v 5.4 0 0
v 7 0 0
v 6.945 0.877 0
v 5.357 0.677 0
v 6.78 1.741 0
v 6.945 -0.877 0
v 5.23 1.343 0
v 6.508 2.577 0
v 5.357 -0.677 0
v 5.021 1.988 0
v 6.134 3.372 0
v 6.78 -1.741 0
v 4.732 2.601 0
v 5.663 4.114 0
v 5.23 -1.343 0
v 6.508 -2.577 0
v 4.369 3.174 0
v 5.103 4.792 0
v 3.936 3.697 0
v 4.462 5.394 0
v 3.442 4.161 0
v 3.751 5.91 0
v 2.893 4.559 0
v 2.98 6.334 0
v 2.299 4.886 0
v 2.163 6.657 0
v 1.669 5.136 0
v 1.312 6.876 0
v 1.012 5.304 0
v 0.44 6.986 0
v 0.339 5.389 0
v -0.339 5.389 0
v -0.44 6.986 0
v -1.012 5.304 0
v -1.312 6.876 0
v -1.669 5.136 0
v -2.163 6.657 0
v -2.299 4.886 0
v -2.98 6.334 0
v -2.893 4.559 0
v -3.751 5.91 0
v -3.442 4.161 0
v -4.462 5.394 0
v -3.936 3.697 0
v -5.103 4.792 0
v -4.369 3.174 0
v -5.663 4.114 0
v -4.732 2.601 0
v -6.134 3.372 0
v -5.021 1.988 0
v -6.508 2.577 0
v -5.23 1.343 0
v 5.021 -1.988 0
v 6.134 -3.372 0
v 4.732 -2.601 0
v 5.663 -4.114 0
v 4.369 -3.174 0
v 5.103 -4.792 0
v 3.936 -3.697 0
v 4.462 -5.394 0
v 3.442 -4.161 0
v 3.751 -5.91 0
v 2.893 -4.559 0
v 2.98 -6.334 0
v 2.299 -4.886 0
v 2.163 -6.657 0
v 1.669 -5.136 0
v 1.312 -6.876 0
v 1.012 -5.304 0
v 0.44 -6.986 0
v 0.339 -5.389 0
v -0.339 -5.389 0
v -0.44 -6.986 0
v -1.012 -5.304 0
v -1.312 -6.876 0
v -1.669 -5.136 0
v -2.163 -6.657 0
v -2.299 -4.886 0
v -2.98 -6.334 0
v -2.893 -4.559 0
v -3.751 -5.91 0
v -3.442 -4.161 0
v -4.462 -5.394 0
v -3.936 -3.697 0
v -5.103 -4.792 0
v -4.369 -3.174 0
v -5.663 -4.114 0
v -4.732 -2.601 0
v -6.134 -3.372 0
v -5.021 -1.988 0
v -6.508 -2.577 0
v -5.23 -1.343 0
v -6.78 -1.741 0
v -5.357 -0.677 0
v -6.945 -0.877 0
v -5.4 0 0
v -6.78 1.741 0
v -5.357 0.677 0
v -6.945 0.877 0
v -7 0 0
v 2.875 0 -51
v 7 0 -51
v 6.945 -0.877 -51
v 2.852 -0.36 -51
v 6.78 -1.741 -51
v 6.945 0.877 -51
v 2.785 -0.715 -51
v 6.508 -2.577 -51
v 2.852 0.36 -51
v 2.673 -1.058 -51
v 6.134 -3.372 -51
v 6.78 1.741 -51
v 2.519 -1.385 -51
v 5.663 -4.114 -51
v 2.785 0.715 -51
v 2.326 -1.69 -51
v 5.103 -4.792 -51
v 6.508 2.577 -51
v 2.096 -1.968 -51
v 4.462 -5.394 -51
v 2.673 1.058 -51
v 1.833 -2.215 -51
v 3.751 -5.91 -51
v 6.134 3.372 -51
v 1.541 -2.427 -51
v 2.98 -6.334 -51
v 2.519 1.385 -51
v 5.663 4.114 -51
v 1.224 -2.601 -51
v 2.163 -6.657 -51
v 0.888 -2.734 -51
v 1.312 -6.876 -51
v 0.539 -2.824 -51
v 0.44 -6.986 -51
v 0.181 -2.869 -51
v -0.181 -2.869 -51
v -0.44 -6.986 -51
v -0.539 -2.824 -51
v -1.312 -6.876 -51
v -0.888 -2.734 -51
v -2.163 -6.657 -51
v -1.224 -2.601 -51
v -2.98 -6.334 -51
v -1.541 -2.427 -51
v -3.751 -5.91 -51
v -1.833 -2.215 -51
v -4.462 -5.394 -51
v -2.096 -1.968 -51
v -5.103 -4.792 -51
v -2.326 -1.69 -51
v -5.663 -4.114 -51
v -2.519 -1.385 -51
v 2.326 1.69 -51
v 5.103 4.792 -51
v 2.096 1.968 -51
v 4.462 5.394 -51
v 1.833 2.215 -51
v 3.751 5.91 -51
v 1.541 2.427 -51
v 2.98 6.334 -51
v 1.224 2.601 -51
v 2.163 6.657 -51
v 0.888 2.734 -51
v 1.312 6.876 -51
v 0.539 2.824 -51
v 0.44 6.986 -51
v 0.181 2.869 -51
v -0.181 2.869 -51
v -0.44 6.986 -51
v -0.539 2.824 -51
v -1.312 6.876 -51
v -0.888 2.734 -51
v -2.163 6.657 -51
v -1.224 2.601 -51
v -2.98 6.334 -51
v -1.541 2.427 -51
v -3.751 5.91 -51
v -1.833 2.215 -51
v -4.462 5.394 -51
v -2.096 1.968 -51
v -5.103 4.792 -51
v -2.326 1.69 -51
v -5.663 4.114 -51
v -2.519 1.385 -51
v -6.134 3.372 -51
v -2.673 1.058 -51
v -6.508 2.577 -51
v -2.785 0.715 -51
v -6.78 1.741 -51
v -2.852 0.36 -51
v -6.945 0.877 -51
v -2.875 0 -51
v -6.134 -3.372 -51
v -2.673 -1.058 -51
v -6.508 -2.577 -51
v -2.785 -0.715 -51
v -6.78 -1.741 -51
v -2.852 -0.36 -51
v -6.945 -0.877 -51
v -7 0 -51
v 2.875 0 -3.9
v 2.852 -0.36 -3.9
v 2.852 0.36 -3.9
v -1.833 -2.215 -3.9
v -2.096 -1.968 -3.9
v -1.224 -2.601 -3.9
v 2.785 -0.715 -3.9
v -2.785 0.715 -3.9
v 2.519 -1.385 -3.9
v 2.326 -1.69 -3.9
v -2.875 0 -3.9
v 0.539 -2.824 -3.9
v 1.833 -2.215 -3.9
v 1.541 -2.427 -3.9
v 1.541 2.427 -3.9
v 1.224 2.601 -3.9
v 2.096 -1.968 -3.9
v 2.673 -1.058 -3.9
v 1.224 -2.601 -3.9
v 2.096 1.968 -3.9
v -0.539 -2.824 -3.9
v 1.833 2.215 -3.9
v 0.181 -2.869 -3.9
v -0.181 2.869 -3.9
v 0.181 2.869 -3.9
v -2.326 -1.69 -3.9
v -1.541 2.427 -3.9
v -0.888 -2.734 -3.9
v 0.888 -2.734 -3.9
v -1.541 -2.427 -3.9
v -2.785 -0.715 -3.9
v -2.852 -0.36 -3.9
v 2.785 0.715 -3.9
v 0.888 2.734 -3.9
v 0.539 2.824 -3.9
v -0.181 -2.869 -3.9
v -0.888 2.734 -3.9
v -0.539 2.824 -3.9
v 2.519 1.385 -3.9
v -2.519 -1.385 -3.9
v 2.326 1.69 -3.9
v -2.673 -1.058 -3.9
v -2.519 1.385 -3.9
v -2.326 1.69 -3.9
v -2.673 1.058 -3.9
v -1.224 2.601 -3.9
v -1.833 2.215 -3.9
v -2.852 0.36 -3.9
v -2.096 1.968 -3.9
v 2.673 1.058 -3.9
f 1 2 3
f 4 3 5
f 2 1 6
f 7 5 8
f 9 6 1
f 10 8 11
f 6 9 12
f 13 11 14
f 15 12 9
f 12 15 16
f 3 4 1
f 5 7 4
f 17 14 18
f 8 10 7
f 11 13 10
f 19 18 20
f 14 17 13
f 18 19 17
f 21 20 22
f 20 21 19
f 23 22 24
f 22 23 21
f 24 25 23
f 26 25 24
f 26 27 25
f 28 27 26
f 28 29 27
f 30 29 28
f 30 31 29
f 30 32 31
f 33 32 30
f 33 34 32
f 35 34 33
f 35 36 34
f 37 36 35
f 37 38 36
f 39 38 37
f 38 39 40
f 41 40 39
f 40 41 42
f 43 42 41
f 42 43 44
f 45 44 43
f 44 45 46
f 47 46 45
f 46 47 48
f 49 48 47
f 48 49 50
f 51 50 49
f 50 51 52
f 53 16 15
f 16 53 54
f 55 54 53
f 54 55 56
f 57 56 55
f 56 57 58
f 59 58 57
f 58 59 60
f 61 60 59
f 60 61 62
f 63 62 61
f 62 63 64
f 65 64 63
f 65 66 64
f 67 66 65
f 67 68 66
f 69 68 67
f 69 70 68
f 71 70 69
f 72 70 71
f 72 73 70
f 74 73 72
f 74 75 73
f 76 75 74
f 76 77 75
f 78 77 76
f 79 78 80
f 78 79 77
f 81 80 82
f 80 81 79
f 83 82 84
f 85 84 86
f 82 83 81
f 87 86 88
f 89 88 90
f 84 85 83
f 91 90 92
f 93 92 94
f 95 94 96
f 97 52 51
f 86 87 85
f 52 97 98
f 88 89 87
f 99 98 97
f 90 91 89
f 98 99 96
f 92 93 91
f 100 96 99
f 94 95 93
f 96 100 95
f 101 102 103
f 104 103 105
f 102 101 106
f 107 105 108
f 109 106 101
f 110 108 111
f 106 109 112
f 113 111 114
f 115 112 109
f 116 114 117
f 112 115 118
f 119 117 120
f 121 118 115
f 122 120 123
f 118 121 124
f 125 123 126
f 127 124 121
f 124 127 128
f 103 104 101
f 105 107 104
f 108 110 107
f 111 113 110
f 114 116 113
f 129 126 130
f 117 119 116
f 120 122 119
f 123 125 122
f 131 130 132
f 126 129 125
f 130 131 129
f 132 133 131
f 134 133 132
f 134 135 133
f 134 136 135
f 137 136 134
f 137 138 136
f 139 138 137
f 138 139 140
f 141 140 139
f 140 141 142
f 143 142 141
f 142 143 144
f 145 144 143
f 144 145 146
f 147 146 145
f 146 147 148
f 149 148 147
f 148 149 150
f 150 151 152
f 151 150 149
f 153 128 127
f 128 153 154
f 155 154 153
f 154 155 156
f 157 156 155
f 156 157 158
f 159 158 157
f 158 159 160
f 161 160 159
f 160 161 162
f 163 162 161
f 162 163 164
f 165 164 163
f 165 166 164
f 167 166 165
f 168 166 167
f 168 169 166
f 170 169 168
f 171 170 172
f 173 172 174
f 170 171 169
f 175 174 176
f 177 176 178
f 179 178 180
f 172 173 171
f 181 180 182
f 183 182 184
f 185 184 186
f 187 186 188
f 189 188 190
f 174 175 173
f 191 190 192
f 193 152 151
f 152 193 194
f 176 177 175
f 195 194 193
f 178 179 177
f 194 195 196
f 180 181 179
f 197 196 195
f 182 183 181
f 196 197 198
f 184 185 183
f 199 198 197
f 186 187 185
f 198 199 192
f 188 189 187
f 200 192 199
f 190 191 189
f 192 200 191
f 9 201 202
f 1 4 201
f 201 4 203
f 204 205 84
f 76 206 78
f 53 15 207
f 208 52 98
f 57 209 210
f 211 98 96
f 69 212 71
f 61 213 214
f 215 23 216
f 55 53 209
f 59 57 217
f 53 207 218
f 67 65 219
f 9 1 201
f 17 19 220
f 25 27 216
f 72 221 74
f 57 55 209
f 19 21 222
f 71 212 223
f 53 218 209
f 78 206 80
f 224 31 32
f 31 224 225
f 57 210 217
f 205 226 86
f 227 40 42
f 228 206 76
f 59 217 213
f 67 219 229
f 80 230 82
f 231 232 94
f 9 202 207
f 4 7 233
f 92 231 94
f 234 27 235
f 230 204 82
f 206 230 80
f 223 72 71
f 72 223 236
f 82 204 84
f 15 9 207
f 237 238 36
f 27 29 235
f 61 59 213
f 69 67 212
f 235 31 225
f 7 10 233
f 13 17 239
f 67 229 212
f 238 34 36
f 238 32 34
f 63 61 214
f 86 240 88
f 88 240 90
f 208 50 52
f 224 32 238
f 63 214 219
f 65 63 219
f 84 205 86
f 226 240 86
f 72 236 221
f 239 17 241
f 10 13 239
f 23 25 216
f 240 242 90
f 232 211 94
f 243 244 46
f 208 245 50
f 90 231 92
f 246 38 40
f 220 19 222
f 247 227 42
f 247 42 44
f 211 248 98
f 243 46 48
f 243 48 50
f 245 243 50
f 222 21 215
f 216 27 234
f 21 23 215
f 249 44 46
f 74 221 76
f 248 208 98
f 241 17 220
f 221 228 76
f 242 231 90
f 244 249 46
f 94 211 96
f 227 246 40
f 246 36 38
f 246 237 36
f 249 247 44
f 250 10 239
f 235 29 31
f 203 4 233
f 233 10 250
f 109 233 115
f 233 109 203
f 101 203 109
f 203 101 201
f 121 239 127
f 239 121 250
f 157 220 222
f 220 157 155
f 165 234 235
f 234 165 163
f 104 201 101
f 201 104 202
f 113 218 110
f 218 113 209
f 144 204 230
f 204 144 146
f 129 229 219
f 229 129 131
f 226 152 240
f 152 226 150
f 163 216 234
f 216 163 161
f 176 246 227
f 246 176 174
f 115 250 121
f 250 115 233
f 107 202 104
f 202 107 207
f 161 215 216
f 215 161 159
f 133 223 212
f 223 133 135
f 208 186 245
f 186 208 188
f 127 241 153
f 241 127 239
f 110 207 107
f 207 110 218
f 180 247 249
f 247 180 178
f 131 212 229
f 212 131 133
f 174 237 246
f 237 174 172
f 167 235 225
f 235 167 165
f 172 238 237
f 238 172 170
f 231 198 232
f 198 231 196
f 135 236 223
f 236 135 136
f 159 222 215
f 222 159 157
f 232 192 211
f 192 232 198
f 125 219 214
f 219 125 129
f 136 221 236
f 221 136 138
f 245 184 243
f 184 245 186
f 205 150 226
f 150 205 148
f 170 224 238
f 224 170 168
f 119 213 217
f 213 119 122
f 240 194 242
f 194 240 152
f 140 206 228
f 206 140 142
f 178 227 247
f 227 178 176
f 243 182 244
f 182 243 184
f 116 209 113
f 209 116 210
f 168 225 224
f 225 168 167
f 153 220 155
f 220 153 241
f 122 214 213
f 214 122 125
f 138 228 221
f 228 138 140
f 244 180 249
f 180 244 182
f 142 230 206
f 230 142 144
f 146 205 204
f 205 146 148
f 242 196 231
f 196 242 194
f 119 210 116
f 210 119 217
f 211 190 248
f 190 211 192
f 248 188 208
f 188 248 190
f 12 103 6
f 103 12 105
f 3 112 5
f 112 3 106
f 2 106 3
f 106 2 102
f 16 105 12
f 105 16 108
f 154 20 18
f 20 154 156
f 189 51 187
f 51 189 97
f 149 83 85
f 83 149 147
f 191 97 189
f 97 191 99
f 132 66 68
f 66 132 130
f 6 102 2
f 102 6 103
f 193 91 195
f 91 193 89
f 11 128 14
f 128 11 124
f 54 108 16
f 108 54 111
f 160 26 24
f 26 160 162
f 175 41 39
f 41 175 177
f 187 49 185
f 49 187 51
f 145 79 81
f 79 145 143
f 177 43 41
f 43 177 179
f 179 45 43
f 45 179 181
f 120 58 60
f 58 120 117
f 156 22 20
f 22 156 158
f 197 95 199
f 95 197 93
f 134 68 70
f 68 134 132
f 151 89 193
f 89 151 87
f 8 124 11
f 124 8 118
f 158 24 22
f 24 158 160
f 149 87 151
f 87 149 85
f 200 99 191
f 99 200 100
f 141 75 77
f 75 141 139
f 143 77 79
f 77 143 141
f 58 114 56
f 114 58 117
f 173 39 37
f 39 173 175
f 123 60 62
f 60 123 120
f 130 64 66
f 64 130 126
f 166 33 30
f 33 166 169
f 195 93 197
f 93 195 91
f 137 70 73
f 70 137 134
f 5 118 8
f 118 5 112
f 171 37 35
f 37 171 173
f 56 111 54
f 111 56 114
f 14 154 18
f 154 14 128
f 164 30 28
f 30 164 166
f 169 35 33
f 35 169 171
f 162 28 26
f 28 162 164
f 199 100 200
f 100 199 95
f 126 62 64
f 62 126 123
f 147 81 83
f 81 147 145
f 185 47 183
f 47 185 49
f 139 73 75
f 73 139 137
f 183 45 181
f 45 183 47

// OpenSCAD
$fn = 50;


difference() {
	union() {
		translate(v = [0, 0, -51.0000000000]) {
			cylinder(h = 51, r = 7.0000000000);
		}
		cylinder(h = 0, r = 13.0000000000);
	}
	union() {
		translate(v = [0, 0, 0]) {
			rotate(a = [0, 0, 0]) {
				difference() {
					union() {
						#translate(v = [0, 0, -51.0000000000]) {
							cylinder(h = 51, r = 2.6000000000);
						}
						#translate(v = [0, 0, -3.9000000000]) {
							cylinder(h = 3.9000000000, r1 = 2.8750000000, r2 = 5.4000000000);
						}
						#translate(v = [0, 0, -51.0000000000]) {
							cylinder(h = 51, r = 2.8750000000);
						}
						#translate(v = [0, 0, -51.0000000000]) {
							cylinder(h = 51, r = 2.6000000000);
						}
					}
					union();
				}
			}
		}
	}
}
